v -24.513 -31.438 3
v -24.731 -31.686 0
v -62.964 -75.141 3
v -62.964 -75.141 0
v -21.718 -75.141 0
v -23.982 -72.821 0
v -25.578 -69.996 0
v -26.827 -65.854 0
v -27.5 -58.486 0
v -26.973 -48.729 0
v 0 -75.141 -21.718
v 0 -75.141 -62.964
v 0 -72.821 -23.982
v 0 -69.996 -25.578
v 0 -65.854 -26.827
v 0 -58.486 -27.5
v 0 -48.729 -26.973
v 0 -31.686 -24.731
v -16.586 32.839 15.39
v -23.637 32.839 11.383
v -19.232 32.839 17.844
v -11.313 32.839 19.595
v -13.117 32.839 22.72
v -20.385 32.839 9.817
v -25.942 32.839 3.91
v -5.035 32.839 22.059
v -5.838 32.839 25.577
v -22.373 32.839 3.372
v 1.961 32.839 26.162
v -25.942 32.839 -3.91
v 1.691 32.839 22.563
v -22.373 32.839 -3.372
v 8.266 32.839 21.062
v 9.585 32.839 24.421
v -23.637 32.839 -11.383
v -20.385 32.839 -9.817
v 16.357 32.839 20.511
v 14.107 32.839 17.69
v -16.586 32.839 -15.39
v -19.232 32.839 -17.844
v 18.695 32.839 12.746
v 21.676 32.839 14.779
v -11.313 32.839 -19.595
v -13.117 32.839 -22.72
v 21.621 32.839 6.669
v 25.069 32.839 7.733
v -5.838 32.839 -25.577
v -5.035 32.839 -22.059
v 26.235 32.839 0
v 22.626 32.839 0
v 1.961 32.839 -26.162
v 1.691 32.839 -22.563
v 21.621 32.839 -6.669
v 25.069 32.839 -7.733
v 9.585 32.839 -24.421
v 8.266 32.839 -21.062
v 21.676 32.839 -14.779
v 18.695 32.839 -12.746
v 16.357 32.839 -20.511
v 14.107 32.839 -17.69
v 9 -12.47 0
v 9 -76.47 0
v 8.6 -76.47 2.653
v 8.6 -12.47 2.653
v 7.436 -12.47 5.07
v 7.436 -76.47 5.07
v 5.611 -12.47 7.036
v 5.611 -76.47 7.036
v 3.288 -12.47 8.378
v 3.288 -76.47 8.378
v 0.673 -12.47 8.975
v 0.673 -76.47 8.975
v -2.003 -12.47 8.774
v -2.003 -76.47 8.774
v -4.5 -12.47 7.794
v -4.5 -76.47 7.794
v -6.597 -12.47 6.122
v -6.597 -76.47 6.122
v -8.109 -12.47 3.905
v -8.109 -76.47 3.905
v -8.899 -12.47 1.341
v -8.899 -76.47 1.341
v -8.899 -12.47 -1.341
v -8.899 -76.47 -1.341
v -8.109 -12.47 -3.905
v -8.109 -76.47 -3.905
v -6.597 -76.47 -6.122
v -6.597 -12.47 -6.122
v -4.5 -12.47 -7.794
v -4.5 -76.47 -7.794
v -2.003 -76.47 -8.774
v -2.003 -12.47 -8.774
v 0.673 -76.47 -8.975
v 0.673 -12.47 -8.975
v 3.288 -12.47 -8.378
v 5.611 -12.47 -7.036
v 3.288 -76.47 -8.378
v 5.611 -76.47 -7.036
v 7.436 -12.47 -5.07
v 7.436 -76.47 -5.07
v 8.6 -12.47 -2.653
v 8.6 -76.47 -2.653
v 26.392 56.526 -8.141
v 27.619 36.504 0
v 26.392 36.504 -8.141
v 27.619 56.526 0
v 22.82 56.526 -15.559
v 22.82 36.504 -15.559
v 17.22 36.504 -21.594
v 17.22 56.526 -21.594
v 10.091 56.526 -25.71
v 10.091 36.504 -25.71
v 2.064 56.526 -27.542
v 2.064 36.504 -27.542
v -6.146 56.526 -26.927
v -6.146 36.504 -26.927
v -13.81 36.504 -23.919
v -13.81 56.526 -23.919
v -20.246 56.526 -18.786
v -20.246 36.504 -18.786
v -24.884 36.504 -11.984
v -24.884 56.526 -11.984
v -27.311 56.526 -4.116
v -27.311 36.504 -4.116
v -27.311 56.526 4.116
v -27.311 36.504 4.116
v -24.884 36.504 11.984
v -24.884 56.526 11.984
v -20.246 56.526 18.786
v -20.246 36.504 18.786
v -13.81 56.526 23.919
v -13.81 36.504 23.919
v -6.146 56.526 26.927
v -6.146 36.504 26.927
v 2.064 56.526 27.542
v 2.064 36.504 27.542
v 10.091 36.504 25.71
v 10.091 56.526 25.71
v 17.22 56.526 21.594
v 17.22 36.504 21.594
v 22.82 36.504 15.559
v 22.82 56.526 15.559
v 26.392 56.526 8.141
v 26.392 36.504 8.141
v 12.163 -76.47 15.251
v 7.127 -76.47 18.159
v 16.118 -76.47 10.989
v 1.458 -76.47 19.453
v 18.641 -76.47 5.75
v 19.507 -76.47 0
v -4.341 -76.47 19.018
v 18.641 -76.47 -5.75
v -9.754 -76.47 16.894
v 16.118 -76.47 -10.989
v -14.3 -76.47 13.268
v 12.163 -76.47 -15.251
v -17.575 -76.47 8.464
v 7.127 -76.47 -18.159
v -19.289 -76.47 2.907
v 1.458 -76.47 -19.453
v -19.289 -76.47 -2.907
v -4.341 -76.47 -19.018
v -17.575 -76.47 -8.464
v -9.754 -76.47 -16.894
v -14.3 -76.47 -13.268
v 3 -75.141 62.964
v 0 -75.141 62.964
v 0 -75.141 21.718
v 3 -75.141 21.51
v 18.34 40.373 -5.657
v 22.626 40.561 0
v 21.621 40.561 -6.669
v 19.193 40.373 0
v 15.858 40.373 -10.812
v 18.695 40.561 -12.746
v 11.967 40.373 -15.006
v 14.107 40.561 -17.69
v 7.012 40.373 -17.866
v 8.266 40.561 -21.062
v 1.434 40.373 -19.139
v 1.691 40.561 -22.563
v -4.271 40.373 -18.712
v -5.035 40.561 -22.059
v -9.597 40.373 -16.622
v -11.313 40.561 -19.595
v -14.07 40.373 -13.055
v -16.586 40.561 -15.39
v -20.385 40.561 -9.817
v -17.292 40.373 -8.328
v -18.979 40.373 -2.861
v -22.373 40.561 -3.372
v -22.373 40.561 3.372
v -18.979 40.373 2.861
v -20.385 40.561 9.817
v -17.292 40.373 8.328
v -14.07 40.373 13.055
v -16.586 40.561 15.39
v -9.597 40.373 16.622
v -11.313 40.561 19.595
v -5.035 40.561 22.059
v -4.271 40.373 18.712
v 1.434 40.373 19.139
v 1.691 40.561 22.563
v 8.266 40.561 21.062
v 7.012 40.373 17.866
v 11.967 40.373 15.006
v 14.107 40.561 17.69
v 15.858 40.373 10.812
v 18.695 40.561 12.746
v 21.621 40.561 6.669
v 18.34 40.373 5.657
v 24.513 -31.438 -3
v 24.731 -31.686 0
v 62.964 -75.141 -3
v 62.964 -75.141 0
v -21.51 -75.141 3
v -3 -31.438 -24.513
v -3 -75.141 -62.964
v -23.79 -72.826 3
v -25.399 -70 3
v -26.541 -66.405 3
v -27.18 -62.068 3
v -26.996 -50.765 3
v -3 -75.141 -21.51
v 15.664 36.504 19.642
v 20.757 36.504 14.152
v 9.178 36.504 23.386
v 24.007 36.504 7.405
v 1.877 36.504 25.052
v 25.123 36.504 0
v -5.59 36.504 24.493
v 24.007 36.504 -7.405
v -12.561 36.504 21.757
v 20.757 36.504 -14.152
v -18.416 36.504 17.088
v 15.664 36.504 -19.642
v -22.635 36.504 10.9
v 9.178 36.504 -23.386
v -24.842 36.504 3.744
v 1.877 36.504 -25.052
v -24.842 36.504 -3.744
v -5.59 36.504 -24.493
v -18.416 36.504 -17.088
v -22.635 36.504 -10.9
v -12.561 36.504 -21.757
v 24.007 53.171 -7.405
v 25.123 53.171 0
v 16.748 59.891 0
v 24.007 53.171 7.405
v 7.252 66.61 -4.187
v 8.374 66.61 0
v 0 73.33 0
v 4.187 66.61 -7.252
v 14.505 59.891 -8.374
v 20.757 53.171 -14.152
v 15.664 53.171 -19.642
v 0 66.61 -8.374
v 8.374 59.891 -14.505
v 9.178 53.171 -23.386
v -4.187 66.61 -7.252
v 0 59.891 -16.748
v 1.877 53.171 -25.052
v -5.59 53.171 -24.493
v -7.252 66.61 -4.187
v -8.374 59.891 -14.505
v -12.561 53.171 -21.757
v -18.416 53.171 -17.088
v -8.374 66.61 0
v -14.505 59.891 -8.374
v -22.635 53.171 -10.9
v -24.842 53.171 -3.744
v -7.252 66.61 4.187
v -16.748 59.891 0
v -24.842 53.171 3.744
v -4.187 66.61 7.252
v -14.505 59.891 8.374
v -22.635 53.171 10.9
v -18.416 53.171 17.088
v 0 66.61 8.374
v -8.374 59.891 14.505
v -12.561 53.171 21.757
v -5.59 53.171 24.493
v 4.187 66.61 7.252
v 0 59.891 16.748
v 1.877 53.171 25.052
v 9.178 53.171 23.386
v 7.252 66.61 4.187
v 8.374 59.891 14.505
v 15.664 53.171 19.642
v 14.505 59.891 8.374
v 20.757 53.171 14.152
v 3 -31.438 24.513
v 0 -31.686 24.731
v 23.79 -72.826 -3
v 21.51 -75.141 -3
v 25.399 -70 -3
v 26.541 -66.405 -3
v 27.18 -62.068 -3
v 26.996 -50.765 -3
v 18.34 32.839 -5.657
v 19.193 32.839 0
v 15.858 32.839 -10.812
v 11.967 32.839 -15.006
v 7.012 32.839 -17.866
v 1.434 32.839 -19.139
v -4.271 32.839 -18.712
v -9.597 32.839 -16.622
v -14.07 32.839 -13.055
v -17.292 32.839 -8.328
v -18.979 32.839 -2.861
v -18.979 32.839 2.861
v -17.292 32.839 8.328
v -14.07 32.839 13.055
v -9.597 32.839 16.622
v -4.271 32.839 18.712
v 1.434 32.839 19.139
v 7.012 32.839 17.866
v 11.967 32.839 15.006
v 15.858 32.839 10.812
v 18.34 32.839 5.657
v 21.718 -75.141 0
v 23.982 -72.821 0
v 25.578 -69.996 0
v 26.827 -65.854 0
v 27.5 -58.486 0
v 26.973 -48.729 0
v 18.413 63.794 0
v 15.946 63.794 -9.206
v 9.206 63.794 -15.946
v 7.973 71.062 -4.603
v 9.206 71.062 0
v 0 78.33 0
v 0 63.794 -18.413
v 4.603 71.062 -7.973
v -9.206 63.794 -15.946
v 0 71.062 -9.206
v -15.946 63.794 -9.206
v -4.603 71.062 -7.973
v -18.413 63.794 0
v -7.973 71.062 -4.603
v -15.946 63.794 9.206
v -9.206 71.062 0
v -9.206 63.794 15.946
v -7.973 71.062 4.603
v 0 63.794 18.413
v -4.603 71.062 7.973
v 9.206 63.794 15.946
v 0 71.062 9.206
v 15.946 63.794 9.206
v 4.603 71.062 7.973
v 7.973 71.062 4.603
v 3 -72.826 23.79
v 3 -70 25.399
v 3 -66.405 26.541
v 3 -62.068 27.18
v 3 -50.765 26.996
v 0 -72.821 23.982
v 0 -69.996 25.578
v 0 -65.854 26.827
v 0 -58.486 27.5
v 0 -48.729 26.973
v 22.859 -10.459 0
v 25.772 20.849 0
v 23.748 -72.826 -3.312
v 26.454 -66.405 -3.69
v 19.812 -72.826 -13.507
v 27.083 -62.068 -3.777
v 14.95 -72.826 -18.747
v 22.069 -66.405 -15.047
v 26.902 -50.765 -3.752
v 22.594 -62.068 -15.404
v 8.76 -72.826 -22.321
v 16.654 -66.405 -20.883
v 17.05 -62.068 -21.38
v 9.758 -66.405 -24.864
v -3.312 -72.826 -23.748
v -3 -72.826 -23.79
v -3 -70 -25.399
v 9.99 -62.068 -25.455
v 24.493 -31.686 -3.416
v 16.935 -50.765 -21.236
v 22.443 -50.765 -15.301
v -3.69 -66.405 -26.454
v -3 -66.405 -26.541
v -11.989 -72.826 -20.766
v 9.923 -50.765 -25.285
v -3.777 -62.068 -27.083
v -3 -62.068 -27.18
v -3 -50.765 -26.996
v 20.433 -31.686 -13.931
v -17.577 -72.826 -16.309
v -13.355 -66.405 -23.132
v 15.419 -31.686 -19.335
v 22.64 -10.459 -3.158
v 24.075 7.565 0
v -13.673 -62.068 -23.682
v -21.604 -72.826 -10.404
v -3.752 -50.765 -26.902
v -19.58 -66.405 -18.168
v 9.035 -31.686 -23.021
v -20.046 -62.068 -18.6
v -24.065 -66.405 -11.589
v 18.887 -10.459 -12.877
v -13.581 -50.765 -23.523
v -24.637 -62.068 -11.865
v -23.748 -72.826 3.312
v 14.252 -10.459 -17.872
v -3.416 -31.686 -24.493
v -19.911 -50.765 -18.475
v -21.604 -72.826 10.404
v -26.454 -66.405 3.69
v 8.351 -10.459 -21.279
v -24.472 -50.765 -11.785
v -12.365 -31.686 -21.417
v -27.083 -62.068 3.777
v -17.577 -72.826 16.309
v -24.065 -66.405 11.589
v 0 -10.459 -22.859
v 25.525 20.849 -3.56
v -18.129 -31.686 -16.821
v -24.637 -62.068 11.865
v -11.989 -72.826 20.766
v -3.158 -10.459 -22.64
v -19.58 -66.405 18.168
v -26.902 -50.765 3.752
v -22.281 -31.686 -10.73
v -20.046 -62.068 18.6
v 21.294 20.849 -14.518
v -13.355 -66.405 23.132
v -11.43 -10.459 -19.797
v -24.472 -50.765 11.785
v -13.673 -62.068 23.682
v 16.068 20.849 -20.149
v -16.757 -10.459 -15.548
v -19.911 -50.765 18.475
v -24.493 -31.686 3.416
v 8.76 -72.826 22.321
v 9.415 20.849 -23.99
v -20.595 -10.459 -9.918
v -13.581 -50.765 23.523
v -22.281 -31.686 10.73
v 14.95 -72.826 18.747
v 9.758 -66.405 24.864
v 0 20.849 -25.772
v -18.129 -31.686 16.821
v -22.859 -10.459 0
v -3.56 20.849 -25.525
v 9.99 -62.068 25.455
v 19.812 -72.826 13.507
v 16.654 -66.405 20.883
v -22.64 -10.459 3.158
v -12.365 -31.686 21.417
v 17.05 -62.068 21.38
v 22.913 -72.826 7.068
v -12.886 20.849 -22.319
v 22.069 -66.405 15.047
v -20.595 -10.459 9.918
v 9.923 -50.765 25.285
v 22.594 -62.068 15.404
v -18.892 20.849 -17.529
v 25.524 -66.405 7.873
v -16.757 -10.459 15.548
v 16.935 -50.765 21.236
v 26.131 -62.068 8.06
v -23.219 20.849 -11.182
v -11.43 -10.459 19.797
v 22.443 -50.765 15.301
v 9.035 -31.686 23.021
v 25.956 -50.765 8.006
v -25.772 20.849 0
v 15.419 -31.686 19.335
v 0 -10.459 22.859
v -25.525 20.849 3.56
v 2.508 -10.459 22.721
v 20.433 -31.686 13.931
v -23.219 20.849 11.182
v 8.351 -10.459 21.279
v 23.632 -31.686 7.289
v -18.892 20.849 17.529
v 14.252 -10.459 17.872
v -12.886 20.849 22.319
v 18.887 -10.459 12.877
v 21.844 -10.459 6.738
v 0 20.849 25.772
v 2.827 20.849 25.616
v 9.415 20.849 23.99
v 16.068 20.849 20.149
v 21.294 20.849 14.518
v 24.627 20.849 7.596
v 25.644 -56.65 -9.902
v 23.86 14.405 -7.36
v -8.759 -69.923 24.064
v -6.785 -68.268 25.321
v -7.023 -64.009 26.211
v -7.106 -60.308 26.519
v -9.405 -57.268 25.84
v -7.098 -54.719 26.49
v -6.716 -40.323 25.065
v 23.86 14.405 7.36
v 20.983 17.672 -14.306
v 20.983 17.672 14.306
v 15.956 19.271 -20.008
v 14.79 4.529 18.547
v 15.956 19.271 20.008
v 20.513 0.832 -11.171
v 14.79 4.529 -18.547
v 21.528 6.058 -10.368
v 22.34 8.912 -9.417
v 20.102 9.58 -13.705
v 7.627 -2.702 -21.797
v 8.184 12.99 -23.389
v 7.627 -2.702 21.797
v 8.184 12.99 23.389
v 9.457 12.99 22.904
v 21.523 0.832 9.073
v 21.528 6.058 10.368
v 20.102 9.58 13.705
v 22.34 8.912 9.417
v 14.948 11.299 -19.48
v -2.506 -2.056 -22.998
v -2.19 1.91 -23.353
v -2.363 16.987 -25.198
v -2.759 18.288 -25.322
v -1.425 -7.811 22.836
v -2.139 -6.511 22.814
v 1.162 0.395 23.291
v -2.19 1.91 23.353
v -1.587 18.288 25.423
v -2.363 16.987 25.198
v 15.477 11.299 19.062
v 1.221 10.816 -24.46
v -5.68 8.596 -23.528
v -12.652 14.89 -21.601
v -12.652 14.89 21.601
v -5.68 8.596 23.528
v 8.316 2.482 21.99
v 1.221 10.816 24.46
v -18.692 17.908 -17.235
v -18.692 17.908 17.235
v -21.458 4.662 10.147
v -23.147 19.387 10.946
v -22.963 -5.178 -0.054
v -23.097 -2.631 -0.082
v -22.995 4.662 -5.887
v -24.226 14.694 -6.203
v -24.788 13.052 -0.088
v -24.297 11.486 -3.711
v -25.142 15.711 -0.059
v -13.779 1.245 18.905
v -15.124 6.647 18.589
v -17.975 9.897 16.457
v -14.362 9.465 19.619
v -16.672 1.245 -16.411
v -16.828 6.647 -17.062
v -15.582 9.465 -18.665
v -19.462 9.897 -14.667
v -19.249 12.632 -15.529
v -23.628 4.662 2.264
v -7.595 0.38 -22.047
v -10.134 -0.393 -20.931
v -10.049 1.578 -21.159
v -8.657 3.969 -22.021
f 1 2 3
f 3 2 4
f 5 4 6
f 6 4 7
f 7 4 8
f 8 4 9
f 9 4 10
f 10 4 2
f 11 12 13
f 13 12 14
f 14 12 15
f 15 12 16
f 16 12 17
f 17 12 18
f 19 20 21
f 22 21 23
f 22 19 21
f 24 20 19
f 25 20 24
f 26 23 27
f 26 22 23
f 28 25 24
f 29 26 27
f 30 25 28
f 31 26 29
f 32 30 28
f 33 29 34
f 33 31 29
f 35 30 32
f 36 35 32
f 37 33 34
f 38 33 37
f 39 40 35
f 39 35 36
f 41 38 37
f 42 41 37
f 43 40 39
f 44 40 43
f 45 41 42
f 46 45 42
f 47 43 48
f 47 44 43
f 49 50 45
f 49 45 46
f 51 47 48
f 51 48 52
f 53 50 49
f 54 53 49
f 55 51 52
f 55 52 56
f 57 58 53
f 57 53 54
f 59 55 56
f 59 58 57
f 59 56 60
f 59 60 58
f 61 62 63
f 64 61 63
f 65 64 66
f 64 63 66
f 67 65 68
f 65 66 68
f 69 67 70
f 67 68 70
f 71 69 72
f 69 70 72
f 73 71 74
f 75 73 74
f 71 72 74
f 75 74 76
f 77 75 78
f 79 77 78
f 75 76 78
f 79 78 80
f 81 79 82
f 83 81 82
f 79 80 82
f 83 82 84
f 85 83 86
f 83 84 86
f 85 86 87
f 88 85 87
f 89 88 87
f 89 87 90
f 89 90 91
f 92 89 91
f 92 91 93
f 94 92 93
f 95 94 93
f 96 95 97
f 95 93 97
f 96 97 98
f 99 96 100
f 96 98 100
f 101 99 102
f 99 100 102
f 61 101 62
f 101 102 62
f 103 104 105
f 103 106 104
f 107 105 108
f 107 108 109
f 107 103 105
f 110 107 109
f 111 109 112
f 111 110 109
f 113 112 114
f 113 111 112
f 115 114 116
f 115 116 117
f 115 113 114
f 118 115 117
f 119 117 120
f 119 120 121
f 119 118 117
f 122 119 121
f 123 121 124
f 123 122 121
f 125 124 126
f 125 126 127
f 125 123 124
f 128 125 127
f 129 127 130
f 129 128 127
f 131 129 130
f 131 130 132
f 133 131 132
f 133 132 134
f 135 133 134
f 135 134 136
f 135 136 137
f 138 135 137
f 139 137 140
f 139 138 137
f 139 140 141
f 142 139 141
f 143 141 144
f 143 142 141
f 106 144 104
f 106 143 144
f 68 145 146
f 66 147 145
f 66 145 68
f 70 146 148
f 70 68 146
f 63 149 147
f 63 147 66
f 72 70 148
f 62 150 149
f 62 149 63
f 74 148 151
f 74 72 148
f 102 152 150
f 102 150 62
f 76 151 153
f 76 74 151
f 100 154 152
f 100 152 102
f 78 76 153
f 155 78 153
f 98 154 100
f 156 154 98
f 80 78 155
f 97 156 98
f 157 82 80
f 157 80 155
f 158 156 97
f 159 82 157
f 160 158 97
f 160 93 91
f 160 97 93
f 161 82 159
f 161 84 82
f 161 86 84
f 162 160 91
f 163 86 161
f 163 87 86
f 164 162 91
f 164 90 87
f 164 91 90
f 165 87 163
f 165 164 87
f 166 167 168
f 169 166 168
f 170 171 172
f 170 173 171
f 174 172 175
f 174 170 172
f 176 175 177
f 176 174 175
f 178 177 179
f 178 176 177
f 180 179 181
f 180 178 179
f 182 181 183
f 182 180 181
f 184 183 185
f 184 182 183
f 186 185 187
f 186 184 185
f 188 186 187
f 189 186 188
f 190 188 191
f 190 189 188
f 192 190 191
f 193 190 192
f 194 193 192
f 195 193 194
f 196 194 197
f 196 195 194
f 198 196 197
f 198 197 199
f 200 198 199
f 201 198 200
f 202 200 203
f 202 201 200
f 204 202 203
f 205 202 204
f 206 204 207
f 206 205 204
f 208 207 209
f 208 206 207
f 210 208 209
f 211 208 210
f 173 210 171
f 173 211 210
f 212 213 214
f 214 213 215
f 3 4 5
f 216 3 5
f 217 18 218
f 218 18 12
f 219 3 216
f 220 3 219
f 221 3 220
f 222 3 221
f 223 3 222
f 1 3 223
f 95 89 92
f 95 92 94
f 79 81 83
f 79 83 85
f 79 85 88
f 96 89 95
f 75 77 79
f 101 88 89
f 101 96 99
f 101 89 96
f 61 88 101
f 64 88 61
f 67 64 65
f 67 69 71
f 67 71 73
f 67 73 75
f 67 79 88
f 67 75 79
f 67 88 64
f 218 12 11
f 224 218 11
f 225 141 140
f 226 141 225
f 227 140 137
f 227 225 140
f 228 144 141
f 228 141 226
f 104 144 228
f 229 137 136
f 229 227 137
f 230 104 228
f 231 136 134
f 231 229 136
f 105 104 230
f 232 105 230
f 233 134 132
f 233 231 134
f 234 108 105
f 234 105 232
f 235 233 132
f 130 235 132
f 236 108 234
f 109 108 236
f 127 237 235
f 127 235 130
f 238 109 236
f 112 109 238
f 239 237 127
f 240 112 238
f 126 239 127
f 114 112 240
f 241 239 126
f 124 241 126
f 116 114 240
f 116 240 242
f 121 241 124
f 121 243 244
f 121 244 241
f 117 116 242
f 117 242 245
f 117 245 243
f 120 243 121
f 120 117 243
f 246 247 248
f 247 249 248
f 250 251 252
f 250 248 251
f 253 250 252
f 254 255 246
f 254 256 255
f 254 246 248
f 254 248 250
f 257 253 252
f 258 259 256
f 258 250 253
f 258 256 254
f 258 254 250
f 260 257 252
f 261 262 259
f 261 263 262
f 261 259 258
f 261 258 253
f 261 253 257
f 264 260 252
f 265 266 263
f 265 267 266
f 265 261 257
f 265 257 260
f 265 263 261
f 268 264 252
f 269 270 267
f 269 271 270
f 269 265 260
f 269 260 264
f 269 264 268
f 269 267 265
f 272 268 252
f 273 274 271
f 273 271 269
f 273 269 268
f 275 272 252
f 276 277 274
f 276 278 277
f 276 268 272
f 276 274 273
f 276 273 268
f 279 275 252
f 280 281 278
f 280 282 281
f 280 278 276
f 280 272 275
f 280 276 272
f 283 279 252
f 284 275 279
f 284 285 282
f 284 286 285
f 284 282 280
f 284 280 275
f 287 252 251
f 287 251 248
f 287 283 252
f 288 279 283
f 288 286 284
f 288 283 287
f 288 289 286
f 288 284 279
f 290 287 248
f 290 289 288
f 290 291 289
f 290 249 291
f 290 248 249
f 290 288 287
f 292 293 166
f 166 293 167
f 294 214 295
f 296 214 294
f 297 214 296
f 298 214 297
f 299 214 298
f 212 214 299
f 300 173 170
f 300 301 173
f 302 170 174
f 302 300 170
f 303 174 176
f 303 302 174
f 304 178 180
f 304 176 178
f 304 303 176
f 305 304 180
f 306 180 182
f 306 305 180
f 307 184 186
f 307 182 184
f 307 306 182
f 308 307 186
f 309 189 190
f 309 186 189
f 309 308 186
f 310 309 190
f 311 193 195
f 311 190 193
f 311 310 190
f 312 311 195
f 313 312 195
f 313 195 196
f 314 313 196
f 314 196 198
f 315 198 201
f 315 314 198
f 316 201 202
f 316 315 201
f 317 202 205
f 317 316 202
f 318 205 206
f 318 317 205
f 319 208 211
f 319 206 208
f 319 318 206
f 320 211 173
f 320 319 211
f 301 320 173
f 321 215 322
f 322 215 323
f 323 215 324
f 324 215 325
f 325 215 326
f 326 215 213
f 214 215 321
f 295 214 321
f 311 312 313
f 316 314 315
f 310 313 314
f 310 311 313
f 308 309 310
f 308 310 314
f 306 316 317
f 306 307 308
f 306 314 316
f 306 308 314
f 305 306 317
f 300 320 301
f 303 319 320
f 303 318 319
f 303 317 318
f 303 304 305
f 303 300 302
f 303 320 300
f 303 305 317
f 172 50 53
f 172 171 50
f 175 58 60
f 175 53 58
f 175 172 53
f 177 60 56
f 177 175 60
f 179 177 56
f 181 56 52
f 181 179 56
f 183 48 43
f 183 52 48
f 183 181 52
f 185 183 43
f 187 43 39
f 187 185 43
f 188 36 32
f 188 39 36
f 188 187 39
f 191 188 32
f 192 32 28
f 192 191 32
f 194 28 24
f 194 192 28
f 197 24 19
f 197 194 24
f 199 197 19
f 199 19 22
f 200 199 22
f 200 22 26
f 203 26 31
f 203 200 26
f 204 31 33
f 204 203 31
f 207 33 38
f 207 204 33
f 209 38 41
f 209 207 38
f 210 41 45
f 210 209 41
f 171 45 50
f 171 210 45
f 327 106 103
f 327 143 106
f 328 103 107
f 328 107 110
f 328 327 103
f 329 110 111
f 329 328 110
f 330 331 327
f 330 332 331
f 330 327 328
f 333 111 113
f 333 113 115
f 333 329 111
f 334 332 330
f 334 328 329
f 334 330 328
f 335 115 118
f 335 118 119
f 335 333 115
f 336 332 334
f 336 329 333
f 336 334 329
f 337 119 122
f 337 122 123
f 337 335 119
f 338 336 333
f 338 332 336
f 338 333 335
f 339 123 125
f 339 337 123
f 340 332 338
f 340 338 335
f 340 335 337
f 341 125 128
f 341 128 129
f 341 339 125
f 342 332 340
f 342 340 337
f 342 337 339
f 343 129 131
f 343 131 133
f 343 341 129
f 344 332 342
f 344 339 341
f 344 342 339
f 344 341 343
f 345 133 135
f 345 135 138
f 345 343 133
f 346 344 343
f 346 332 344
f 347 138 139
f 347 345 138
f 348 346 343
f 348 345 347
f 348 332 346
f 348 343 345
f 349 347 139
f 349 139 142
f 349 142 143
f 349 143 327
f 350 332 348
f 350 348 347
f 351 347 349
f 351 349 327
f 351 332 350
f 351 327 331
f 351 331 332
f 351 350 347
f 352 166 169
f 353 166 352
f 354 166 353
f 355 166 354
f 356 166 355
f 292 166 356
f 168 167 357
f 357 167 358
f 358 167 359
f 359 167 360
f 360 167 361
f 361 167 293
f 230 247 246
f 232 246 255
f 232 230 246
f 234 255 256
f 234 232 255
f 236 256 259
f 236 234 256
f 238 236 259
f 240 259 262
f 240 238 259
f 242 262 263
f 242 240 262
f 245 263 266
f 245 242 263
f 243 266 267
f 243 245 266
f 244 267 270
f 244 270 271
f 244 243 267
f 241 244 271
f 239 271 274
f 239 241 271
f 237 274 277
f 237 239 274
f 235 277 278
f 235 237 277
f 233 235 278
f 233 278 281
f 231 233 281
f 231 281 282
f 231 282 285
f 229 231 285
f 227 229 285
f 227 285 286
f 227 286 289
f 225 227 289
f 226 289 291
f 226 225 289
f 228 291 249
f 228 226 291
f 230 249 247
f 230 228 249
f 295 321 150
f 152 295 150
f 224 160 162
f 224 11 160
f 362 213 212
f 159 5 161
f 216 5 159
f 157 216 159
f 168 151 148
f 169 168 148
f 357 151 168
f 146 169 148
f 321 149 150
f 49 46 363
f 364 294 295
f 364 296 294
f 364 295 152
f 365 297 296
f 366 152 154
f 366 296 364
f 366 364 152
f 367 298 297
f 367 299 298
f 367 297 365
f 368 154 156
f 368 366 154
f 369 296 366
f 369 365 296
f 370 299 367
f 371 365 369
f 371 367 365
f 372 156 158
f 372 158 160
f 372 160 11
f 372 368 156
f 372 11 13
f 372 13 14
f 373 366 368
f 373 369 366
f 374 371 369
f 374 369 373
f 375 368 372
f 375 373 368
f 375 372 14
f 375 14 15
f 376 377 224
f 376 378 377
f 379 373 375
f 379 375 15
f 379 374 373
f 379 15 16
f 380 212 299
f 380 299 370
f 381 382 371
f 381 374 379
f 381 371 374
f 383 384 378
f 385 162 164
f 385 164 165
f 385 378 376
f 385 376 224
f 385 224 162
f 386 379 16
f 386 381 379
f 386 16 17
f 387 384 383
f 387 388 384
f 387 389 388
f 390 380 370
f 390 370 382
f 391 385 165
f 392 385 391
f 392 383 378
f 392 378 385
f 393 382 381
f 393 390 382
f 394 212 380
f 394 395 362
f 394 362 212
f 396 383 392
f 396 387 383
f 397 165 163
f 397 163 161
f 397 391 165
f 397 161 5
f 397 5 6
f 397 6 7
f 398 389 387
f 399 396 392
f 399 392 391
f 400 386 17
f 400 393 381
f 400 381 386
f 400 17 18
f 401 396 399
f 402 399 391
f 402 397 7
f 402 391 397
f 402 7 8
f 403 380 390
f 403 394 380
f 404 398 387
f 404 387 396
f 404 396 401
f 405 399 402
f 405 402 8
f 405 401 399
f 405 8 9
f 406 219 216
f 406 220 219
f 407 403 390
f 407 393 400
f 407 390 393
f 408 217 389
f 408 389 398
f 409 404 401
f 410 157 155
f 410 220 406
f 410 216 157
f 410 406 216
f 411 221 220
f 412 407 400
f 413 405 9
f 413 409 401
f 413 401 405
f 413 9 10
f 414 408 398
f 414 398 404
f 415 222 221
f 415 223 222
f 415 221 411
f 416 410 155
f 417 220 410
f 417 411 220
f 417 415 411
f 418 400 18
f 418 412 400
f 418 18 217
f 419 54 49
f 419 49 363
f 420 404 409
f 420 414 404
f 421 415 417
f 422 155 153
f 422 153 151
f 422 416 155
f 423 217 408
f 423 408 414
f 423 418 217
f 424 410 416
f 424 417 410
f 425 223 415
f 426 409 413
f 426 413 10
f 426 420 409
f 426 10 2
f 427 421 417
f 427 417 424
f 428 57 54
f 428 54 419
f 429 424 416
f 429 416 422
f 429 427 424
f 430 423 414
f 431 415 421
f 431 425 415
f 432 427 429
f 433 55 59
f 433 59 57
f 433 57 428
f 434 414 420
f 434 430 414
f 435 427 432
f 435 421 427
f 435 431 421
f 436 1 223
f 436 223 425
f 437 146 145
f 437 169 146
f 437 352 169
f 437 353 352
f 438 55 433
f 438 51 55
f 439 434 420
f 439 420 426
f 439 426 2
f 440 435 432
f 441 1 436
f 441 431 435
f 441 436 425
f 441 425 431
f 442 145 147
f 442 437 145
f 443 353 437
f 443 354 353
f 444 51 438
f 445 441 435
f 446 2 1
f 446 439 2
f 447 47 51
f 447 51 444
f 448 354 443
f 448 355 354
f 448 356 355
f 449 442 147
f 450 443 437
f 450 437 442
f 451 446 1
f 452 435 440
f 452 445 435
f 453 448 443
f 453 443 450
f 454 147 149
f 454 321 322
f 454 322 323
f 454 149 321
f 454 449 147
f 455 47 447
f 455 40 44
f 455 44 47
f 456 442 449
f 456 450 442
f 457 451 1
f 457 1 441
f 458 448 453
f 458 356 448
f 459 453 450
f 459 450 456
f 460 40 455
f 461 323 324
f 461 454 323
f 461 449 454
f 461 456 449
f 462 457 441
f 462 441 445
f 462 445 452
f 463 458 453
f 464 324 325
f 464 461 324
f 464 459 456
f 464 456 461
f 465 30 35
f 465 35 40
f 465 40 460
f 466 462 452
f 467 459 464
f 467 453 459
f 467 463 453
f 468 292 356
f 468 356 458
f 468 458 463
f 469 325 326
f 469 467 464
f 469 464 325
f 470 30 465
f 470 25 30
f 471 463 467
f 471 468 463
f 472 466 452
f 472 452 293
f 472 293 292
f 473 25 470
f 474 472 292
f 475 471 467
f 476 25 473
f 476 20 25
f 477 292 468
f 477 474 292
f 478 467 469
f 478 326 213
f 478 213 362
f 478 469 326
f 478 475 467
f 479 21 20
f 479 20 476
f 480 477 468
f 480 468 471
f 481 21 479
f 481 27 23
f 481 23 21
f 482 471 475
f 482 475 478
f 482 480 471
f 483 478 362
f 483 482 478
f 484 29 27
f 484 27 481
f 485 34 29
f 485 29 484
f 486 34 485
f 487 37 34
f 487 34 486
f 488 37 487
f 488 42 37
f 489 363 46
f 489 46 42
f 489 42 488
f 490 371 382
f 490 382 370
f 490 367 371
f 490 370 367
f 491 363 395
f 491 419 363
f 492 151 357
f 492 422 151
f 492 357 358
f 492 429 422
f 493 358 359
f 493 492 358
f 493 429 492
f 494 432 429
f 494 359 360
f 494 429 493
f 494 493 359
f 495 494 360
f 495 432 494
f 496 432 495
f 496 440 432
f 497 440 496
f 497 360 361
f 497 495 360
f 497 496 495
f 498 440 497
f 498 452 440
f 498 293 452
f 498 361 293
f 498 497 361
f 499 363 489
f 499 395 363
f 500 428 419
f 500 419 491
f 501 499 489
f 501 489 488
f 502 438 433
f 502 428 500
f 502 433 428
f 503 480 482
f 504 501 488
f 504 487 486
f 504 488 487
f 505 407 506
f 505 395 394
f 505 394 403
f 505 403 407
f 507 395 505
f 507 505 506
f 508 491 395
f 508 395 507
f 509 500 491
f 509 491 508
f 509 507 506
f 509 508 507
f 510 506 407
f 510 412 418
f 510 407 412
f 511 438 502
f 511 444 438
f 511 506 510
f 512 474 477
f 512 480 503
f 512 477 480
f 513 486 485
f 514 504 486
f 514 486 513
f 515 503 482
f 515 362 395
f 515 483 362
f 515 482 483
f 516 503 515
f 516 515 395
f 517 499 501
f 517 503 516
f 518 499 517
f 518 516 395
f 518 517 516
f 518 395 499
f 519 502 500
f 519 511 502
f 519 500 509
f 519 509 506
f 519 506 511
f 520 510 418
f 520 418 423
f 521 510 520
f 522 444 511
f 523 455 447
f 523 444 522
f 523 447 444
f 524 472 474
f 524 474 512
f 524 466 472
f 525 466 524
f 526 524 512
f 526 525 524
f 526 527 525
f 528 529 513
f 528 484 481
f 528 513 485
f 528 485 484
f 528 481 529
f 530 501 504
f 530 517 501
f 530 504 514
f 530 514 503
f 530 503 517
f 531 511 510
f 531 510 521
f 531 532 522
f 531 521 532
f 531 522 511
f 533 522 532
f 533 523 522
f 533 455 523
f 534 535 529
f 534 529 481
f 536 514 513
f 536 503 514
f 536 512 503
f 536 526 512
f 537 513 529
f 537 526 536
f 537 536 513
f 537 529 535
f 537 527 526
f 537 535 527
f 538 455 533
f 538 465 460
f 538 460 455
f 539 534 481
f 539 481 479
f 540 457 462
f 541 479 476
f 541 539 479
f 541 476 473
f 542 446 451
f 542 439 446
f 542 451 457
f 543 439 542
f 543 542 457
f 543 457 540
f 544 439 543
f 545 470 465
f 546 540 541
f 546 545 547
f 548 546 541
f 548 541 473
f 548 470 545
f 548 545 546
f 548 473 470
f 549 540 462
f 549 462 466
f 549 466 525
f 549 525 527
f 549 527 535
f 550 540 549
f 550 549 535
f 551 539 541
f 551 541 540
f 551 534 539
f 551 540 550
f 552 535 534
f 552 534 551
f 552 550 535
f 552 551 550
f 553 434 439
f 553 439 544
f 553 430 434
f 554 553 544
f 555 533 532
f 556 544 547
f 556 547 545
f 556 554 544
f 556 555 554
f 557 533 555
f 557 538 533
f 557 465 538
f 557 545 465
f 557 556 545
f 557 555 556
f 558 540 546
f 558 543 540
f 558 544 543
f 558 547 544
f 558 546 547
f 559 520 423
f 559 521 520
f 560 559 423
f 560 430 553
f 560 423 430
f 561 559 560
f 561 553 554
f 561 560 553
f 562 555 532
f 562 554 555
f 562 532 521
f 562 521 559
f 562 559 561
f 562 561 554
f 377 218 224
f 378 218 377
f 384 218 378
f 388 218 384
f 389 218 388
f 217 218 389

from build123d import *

# Parameters (mm, degrees)
F3_DEPTH = 3
F4_COUNT = 4
F5_R     = 9
F6_DEPTH = 64


with BuildPart() as f1:
    # F0 (on Top) → F1 (revolve)
    with BuildSketch(Plane.XY):
        Polygon((0, 78.3304050565), (0, 73.3296349645), (25.1227430999, 53.1712672173), (25.1227430999, 36.5037508309), (27.6194103062, 36.5037508309), (27.6194103062, 56.5263518006), align=None)
    revolve(axis=Axis((0, 0.458072871, 0), (0, 1, 0)))


with BuildPart() as f1b:
    # F0 (on Top) → F1, piece 2 (revolve)
    with BuildSketch(Plane.XY):
        with BuildLine():
            Line((0, 32.8392432414), (0, -76.4704482857))
            Line((0, -76.4704482857), (19.5072996486, -76.4704482857))
            add(Edge.make_bspline(
                [(19.5072996486, -76.4704482857), (34.0880141667, -69.7419434883), (15.8433199539, -12.5422067499), (27.1028720904, 19.1866374149), (26.2349213479, 32.8392432414)],
                knots=[0, 0, 0, 0, 0.5223373822, 1, 1, 1, 1], degree=3))
            Line((26.2349213479, 32.8392432414), (22.626074031, 32.8392432414))
            Line((22.626074031, 32.8392432414), (22.626074031, 40.5608378351))
            Line((22.626074031, 40.5608378351), (19.1931519657, 40.3733606302))
            Line((19.1931519657, 40.3733606302), (19.1931519657, 32.8392432414))
            Line((19.1931519657, 32.8392432414), (0, 32.8392432414))
        make_face()
    revolve(axis=Axis((0, 0.458072871, 0), (0, 1, 0)))

    # F2 (on Top) → F3 (join)
    with BuildSketch(Plane.XY):
        Polygon((-62.9644419025, -75.141005218), (-20.0095027685, -75.141005218), (-19.4292590022, -25.6603136659), align=None)
    extrude(amount=F3_DEPTH)

    # F4: F1b ×4 about axis
    f4_axis = Axis((0, 0.458072871, 0), (0, 1, 0))


with BuildPart() as f1b_1:
    add(f1b.part)
    for i in range(1, F4_COUNT):
        add(f1b.part.rotate(f4_axis, i * 360 / F4_COUNT))

    # F5 (on face) → F6 (cut)
    with BuildSketch(Plane.XZ.offset(76.4704482857)):
        Circle(F5_R)
    extrude(amount=-F6_DEPTH, mode=Mode.SUBTRACT)


solid = Compound([f1.part, f1b_1.part])
